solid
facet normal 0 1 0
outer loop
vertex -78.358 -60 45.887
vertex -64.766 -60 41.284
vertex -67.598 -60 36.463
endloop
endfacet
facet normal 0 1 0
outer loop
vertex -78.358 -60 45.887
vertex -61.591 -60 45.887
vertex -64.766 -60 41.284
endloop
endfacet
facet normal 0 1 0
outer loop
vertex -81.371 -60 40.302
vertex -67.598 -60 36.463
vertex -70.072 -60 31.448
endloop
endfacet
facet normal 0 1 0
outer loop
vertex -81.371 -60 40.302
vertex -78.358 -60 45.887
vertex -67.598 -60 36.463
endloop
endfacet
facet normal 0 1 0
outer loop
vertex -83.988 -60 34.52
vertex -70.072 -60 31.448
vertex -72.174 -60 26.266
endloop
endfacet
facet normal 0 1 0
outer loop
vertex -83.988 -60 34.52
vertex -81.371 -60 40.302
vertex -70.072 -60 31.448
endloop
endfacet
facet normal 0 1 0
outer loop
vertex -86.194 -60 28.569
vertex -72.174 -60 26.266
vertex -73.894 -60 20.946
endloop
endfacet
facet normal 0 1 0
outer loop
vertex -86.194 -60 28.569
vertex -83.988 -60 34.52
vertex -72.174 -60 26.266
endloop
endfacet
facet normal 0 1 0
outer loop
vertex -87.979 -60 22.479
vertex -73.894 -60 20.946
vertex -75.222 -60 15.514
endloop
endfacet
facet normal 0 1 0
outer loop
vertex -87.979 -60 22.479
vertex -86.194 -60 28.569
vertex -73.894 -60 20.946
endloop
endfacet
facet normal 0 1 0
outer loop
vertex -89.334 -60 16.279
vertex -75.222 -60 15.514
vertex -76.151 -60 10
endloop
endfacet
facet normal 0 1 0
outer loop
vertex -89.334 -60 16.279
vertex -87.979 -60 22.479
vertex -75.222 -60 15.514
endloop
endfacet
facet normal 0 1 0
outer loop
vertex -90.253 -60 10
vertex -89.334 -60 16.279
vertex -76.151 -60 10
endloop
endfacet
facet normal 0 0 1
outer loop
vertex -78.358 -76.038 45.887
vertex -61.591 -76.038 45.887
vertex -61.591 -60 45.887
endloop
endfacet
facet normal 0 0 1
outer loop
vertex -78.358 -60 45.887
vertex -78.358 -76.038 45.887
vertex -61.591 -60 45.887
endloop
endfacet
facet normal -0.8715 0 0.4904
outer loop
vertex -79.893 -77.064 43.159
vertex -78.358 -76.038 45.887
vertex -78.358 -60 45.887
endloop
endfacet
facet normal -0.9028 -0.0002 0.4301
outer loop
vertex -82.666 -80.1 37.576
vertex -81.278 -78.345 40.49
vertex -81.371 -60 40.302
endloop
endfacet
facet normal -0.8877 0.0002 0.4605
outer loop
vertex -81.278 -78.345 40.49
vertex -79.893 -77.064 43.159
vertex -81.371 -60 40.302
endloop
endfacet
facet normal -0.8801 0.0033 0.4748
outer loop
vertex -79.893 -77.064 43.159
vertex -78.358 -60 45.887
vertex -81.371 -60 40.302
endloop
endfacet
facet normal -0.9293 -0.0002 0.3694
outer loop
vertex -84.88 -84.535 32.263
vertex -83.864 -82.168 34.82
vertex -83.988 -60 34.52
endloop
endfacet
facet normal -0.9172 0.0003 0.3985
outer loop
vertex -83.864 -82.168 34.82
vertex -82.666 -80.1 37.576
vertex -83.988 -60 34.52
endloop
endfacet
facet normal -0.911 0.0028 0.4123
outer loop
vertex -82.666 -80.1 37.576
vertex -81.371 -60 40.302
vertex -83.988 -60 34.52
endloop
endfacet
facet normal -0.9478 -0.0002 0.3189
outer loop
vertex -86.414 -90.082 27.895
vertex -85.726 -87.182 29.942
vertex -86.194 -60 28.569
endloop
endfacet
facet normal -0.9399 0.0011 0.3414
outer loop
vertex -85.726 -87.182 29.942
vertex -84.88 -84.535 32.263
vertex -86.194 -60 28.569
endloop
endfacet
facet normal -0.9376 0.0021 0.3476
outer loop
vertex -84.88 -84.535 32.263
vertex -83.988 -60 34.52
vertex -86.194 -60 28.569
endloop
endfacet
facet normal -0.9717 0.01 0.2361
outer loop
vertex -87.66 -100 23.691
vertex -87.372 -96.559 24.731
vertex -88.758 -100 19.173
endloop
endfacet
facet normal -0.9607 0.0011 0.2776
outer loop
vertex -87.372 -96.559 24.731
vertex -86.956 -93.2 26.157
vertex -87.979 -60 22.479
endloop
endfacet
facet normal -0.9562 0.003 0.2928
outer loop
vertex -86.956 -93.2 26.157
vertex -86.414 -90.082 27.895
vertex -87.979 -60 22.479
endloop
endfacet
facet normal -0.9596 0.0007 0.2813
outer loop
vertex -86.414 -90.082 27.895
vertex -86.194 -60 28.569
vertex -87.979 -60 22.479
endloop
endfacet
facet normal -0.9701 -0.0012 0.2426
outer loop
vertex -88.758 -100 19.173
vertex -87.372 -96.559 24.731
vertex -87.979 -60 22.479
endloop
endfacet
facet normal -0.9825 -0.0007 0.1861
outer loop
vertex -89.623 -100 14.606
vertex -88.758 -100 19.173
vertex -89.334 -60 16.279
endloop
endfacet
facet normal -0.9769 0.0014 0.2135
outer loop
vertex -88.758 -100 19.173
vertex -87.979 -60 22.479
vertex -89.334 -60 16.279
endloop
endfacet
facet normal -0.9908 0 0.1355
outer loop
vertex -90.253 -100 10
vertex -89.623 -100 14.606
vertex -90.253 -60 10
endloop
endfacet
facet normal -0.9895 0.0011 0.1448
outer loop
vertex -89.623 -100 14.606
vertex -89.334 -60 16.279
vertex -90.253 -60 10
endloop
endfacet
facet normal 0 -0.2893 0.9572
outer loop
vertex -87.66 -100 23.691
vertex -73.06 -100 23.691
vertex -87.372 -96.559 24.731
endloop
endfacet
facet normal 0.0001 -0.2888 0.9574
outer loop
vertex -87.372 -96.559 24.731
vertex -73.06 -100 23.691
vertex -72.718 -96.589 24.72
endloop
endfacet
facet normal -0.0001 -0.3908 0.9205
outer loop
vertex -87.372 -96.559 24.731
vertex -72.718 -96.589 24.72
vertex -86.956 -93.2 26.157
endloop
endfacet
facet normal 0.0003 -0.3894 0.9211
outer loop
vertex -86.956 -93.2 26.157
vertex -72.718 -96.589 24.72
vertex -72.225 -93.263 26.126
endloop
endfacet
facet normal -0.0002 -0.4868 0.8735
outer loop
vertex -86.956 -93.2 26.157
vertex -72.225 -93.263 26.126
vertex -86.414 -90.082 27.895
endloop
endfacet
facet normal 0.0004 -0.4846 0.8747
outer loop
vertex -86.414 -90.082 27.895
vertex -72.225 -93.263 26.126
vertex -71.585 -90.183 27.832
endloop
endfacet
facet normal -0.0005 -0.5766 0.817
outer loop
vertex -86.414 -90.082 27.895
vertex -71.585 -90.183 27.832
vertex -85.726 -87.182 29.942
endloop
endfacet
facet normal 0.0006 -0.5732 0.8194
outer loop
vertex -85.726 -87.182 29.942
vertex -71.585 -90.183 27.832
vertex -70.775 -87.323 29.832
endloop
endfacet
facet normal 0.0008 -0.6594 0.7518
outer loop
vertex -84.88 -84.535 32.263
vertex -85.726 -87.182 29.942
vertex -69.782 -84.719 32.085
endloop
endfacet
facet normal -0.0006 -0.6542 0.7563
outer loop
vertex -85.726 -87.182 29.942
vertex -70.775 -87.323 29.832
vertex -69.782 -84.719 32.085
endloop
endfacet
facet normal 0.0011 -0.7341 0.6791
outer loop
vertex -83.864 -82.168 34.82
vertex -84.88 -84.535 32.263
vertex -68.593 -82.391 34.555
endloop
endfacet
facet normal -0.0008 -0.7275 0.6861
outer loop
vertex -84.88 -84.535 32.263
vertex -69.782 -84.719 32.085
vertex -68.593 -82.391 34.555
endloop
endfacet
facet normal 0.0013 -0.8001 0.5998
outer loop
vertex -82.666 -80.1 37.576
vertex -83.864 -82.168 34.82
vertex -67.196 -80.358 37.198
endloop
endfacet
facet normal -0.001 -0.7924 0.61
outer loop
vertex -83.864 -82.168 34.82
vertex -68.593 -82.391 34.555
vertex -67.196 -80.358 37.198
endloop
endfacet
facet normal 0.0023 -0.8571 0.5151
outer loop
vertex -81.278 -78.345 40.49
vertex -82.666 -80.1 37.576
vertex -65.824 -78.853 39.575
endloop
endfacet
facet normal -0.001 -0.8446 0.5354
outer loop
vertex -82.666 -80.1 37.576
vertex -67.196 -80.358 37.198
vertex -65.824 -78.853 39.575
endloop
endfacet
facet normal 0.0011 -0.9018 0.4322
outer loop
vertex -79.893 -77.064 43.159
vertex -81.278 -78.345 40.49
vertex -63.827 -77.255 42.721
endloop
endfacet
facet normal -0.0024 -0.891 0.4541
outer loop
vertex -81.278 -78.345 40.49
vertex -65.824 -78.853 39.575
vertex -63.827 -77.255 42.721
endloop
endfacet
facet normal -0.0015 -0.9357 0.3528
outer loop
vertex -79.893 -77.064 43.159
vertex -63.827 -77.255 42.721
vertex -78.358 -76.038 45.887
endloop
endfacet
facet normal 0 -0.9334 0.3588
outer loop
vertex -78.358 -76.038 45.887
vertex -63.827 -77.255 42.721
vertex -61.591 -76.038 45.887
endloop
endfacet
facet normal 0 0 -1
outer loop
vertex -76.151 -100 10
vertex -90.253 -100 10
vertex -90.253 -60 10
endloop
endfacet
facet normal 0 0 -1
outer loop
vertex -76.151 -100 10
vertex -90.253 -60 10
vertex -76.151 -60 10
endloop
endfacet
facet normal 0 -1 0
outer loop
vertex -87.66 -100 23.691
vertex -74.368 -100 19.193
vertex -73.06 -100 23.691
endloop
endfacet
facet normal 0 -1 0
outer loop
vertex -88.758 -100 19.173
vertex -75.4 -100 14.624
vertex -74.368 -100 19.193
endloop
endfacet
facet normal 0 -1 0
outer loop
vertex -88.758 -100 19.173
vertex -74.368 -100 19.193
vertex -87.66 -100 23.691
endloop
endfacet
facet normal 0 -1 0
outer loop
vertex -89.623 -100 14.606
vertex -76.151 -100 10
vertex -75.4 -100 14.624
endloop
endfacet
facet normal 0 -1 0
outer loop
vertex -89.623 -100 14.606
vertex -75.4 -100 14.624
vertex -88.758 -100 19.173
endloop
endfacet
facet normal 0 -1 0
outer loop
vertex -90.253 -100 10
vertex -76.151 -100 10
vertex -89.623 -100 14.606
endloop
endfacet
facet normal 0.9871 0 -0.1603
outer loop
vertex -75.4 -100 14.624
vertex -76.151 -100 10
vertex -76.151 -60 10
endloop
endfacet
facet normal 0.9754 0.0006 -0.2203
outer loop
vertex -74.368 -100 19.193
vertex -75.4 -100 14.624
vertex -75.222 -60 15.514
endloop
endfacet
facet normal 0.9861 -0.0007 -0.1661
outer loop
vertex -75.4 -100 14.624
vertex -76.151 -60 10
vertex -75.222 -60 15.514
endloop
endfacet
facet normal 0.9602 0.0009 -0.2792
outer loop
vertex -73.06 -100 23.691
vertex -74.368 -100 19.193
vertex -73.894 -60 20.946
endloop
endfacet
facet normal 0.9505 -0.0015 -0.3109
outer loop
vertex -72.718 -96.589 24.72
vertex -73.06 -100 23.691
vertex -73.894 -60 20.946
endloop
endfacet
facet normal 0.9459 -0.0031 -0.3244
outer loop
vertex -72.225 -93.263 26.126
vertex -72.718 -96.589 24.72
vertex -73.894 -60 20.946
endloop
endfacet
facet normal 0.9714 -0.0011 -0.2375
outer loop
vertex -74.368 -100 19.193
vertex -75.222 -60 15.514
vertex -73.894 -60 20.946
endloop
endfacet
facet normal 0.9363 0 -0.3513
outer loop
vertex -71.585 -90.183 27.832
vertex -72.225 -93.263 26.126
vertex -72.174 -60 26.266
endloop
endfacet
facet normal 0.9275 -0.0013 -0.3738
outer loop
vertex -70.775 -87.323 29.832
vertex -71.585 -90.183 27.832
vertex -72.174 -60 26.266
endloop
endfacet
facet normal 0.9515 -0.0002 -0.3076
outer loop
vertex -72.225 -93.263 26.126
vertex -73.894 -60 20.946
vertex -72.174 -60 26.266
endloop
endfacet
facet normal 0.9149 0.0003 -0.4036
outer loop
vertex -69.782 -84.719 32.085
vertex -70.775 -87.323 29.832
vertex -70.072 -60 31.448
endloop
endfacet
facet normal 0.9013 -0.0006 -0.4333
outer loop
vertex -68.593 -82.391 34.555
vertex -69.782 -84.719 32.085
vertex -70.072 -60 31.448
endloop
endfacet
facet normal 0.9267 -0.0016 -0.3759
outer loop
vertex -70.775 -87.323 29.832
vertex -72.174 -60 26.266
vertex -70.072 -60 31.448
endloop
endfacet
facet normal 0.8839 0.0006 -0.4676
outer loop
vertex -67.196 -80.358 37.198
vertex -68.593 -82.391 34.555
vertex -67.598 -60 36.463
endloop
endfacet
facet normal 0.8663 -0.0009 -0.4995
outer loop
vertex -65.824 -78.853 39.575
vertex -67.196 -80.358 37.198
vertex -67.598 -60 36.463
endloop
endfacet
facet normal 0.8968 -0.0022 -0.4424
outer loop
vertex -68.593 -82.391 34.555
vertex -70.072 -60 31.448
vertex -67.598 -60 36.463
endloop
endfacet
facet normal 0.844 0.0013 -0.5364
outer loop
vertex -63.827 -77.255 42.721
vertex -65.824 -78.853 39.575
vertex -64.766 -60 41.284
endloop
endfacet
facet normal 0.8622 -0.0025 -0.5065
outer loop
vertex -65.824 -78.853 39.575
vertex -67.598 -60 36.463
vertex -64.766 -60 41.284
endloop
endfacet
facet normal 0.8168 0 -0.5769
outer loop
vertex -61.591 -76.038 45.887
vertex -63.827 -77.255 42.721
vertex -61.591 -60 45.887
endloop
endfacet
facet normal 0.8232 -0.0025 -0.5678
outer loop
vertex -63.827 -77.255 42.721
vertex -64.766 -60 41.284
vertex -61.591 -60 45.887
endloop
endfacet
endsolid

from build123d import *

# Parameters (mm, degrees)
BOSS_EXTRUDE1_DEPTH      = 60
SKETCH25_W               = 5.5
SKETCH25_H               = 17
BOSS_EXTRUDE3_DEPTH      = 20
FILLET1_R                = 2.3
SKETCH28_W               = 8
SKETCH28_H               = 10
CUT_EXTRUDE17_DEPTH      = 265
CUT_EXTRUDE19_DEPTH      = 165.638713704
CUT_EXTRUDE19_DEPTH_BACK = 165.638713704
SKETCH30_W               = 183.61
SKETCH30_H               = 30
CUT_EXTRUDE20_DEPTH      = 165.638713704
CUT_EXTRUDE20_DEPTH_BACK = 165.638713704
SKETCH32_W               = 3
SKETCH32_H               = 14
CUT_EXTRUDE23_DEPTH      = 44
CUT_EXTRUDE23_DEPTH_BACK = 254
SKETCH40_W               = 29.770973954
SKETCH40_H               = 62.053600945
SKETCH41_R               = 3
CUT_EXTRUDE24_DEPTH      = 254
BOSS_EXTRUDE4_DEPTH      = 40
CUT_EXTRUDE21_DEPTH      = 90
CUT_EXTRUDE22_DEPTH      = 164.320868502
CUT_EXTRUDE22_DEPTH_BACK = 164.320868502


with BuildPart() as part:
    # Sketch1 → Boss-Extrude1 (new body)
    with BuildSketch(Plane(origin=(0, 0, 0), x_dir=(1, 0, 0), z_dir=(0, 1, 0))):
        with BuildLine():
            Line((91.805, -10), (90.252689849, -10))
            ThreePointArc((90.252689849, -10), (0, -90.805), (-90.252689849, -10))
            Line((-90.252689849, -10), (-91.805, -10))
            Line((-91.805, -10), (-91.805, 20))
            Line((-91.805, 20), (-76.805, 20))
            Line((-76.805, 20), (-76.805, 0))
            ThreePointArc((-76.805, 0), (0, -76.805), (76.805, 0))
            Line((76.805, 0), (76.805, 20))
            Line((76.805, 20), (91.805, 20))
            Line((91.805, 20), (91.805, -10))
        make_face()
    extrude(amount=-BOSS_EXTRUDE1_DEPTH)

    # Sketch25 → Boss-Extrude3 (add)
    with BuildSketch(Plane(origin=(0, -60, 0), x_dir=(-1, 0, 0), z_dir=(0, -1, 0))):
        with Locations((84.305, 5)):
            Rectangle(SKETCH25_W, SKETCH25_H)
        with Locations((-84.305, 5)):
            Rectangle(SKETCH25_W, SKETCH25_H)
    extrude(amount=BOSS_EXTRUDE3_DEPTH)

    # Fillet1
    fillet1_edges = [part.edges().sort_by_distance(p)[0] for p in [
        (84.305, -60, 3.5),
        (81.555, -60, -5),
        (87.055, -60, -5),
        (84.305, -60, -13.5),
        (-84.305, -60, 3.5),
        (-87.055, -60, -5),
        (-81.555, -60, -5),
        (-84.305, -60, -13.5),
    ]]
    fillet(fillet1_edges, radius=FILLET1_R)

    # Sketch28 → Cut-Extrude17 (cut)
    with BuildSketch(Plane(origin=(91.805, 0, 0), x_dir=(0, 0, -1), z_dir=(1, 0, 0))):
        with Locations((5, -42)):
            Rectangle(SKETCH28_W, SKETCH28_H)
    extrude(amount=-CUT_EXTRUDE17_DEPTH, mode=Mode.SUBTRACT)

    # Sketch30 → Cut-Extrude19 (cut, two sides: drawn at the far end of the back side and taken through both)
    with BuildSketch(Plane(origin=(0, 0, -20), x_dir=(-1, 0, 0), z_dir=(0, 0, -1)).offset(-CUT_EXTRUDE19_DEPTH_BACK)):
        with Locations((0, -15)):
            Rectangle(SKETCH30_W, SKETCH30_H)
    extrude(amount=CUT_EXTRUDE19_DEPTH + CUT_EXTRUDE19_DEPTH_BACK, mode=Mode.SUBTRACT)

    # Sketch32 → Cut-Extrude20 (cut, two sides: drawn at the far end of the back side and taken through both)
    with BuildSketch(Plane(origin=(0, 0, -20), x_dir=(-1, 0, 0), z_dir=(0, 0, -1)).offset(-CUT_EXTRUDE20_DEPTH_BACK)):
        with Locations((51.773928511, -44)):
            Rectangle(SKETCH32_W, SKETCH32_H)
        with Locations((-65.13523483, -44)):
            Rectangle(SKETCH32_W, SKETCH32_H)
        with Locations((-51.773928511, -44)):
            Rectangle(SKETCH32_W, SKETCH32_H)
        with Locations((65.13523483, -44)):
            Rectangle(SKETCH32_W, SKETCH32_H)
    extrude(amount=CUT_EXTRUDE20_DEPTH + CUT_EXTRUDE20_DEPTH_BACK, mode=Mode.SUBTRACT)

    # Sketch40 → Cut-Extrude23 (cut, two sides: drawn at the far end of the back side and taken through both)
    with BuildSketch(Plane.ZY.offset(87.055).offset(-CUT_EXTRUDE23_DEPTH_BACK)):
        with Locations((-5.114513023, -61.026800472)):
            Rectangle(SKETCH40_W, SKETCH40_H)
    extrude(amount=CUT_EXTRUDE23_DEPTH + CUT_EXTRUDE23_DEPTH_BACK, mode=Mode.SUBTRACT)

    # Sketch41 → Cut-Extrude24 (cut)
    with BuildSketch(Plane(origin=(0, 0, 9.770973954), x_dir=(-1, 0, 0), z_dir=(0, 0, -1))):
        with Locations((-83.992971555, -37.5)):
            Circle(SKETCH41_R)
        with Locations((-83.992971555, -52.5)):
            Circle(SKETCH41_R)
        with Locations((83.992971555, -52.5)):
            Circle(SKETCH41_R)
        with Locations((83.992971555, -37.5)):
            Circle(SKETCH41_R)
    extrude(amount=-CUT_EXTRUDE24_DEPTH, mode=Mode.SUBTRACT)

    # Sketch33 → Boss-Extrude4 (add)
    with BuildSketch(Plane(origin=(0, -60, 0), x_dir=(-1, 0, 0), z_dir=(0, -1, 0))):
        with BuildLine():
            Line((90.252689849, -10), (76.151218145, -10))
            ThreePointArc((76.151218145, -10), (71.169996018, -28.876282513), (61.590580503, -45.886909008))
            Line((61.590580503, -45.886909008), (73.898492454, -52.768938193))
            ThreePointArc((73.898492454, -52.768938193), (84.815671791, -32.432234638), (90.252689849, -10))
        make_face()
    extrude(amount=BOSS_EXTRUDE4_DEPTH)

    # Sketch37 → Cut-Extrude21 (cut)
    with BuildSketch(Plane(origin=(0, 0, 0), x_dir=(0, 0, -1), z_dir=(1, 0, 0))):
        with BuildLine():
            Line((-0.881303102, -100), (-23.690614963, -100))
            ThreePointArc((-23.690614963, -100), (-31.684760451, -85.14357588), (-45.886909008, -76.037606625))
            Line((-45.886909008, -76.037606625), (-45.886909008, -59.917167305))
            Line((-45.886909008, -59.917167305), (-66.948234535, -59.917167305))
            Line((-66.948234535, -59.917167305), (-63.746381293, -92.441906362))
            Line((-63.746381293, -92.441906362), (-47.571757556, -115.346464391))
            Line((-47.571757556, -115.346464391), (-8.086377987, -115.346464391))
            Line((-8.086377987, -115.346464391), (-0.881303102, -100))
        make_face()
    extrude(amount=-CUT_EXTRUDE21_DEPTH, mode=Mode.SUBTRACT)

    # Sketch38 → Cut-Extrude22 (cut, two sides: drawn at the far end of the back side and taken through both)
    with BuildSketch(Plane(origin=(0, 0, 0), x_dir=(0, 0, -1), z_dir=(1, 0, 0)).offset(-CUT_EXTRUDE22_DEPTH_BACK)):
        Polygon((20, -30), (-90.805, -30), (-90.805, -60), (-10, -60), (-10, -100), (20, -100), (20, -60), align=None)
    extrude(amount=CUT_EXTRUDE22_DEPTH + CUT_EXTRUDE22_DEPTH_BACK, mode=Mode.SUBTRACT)


solid = part.part
